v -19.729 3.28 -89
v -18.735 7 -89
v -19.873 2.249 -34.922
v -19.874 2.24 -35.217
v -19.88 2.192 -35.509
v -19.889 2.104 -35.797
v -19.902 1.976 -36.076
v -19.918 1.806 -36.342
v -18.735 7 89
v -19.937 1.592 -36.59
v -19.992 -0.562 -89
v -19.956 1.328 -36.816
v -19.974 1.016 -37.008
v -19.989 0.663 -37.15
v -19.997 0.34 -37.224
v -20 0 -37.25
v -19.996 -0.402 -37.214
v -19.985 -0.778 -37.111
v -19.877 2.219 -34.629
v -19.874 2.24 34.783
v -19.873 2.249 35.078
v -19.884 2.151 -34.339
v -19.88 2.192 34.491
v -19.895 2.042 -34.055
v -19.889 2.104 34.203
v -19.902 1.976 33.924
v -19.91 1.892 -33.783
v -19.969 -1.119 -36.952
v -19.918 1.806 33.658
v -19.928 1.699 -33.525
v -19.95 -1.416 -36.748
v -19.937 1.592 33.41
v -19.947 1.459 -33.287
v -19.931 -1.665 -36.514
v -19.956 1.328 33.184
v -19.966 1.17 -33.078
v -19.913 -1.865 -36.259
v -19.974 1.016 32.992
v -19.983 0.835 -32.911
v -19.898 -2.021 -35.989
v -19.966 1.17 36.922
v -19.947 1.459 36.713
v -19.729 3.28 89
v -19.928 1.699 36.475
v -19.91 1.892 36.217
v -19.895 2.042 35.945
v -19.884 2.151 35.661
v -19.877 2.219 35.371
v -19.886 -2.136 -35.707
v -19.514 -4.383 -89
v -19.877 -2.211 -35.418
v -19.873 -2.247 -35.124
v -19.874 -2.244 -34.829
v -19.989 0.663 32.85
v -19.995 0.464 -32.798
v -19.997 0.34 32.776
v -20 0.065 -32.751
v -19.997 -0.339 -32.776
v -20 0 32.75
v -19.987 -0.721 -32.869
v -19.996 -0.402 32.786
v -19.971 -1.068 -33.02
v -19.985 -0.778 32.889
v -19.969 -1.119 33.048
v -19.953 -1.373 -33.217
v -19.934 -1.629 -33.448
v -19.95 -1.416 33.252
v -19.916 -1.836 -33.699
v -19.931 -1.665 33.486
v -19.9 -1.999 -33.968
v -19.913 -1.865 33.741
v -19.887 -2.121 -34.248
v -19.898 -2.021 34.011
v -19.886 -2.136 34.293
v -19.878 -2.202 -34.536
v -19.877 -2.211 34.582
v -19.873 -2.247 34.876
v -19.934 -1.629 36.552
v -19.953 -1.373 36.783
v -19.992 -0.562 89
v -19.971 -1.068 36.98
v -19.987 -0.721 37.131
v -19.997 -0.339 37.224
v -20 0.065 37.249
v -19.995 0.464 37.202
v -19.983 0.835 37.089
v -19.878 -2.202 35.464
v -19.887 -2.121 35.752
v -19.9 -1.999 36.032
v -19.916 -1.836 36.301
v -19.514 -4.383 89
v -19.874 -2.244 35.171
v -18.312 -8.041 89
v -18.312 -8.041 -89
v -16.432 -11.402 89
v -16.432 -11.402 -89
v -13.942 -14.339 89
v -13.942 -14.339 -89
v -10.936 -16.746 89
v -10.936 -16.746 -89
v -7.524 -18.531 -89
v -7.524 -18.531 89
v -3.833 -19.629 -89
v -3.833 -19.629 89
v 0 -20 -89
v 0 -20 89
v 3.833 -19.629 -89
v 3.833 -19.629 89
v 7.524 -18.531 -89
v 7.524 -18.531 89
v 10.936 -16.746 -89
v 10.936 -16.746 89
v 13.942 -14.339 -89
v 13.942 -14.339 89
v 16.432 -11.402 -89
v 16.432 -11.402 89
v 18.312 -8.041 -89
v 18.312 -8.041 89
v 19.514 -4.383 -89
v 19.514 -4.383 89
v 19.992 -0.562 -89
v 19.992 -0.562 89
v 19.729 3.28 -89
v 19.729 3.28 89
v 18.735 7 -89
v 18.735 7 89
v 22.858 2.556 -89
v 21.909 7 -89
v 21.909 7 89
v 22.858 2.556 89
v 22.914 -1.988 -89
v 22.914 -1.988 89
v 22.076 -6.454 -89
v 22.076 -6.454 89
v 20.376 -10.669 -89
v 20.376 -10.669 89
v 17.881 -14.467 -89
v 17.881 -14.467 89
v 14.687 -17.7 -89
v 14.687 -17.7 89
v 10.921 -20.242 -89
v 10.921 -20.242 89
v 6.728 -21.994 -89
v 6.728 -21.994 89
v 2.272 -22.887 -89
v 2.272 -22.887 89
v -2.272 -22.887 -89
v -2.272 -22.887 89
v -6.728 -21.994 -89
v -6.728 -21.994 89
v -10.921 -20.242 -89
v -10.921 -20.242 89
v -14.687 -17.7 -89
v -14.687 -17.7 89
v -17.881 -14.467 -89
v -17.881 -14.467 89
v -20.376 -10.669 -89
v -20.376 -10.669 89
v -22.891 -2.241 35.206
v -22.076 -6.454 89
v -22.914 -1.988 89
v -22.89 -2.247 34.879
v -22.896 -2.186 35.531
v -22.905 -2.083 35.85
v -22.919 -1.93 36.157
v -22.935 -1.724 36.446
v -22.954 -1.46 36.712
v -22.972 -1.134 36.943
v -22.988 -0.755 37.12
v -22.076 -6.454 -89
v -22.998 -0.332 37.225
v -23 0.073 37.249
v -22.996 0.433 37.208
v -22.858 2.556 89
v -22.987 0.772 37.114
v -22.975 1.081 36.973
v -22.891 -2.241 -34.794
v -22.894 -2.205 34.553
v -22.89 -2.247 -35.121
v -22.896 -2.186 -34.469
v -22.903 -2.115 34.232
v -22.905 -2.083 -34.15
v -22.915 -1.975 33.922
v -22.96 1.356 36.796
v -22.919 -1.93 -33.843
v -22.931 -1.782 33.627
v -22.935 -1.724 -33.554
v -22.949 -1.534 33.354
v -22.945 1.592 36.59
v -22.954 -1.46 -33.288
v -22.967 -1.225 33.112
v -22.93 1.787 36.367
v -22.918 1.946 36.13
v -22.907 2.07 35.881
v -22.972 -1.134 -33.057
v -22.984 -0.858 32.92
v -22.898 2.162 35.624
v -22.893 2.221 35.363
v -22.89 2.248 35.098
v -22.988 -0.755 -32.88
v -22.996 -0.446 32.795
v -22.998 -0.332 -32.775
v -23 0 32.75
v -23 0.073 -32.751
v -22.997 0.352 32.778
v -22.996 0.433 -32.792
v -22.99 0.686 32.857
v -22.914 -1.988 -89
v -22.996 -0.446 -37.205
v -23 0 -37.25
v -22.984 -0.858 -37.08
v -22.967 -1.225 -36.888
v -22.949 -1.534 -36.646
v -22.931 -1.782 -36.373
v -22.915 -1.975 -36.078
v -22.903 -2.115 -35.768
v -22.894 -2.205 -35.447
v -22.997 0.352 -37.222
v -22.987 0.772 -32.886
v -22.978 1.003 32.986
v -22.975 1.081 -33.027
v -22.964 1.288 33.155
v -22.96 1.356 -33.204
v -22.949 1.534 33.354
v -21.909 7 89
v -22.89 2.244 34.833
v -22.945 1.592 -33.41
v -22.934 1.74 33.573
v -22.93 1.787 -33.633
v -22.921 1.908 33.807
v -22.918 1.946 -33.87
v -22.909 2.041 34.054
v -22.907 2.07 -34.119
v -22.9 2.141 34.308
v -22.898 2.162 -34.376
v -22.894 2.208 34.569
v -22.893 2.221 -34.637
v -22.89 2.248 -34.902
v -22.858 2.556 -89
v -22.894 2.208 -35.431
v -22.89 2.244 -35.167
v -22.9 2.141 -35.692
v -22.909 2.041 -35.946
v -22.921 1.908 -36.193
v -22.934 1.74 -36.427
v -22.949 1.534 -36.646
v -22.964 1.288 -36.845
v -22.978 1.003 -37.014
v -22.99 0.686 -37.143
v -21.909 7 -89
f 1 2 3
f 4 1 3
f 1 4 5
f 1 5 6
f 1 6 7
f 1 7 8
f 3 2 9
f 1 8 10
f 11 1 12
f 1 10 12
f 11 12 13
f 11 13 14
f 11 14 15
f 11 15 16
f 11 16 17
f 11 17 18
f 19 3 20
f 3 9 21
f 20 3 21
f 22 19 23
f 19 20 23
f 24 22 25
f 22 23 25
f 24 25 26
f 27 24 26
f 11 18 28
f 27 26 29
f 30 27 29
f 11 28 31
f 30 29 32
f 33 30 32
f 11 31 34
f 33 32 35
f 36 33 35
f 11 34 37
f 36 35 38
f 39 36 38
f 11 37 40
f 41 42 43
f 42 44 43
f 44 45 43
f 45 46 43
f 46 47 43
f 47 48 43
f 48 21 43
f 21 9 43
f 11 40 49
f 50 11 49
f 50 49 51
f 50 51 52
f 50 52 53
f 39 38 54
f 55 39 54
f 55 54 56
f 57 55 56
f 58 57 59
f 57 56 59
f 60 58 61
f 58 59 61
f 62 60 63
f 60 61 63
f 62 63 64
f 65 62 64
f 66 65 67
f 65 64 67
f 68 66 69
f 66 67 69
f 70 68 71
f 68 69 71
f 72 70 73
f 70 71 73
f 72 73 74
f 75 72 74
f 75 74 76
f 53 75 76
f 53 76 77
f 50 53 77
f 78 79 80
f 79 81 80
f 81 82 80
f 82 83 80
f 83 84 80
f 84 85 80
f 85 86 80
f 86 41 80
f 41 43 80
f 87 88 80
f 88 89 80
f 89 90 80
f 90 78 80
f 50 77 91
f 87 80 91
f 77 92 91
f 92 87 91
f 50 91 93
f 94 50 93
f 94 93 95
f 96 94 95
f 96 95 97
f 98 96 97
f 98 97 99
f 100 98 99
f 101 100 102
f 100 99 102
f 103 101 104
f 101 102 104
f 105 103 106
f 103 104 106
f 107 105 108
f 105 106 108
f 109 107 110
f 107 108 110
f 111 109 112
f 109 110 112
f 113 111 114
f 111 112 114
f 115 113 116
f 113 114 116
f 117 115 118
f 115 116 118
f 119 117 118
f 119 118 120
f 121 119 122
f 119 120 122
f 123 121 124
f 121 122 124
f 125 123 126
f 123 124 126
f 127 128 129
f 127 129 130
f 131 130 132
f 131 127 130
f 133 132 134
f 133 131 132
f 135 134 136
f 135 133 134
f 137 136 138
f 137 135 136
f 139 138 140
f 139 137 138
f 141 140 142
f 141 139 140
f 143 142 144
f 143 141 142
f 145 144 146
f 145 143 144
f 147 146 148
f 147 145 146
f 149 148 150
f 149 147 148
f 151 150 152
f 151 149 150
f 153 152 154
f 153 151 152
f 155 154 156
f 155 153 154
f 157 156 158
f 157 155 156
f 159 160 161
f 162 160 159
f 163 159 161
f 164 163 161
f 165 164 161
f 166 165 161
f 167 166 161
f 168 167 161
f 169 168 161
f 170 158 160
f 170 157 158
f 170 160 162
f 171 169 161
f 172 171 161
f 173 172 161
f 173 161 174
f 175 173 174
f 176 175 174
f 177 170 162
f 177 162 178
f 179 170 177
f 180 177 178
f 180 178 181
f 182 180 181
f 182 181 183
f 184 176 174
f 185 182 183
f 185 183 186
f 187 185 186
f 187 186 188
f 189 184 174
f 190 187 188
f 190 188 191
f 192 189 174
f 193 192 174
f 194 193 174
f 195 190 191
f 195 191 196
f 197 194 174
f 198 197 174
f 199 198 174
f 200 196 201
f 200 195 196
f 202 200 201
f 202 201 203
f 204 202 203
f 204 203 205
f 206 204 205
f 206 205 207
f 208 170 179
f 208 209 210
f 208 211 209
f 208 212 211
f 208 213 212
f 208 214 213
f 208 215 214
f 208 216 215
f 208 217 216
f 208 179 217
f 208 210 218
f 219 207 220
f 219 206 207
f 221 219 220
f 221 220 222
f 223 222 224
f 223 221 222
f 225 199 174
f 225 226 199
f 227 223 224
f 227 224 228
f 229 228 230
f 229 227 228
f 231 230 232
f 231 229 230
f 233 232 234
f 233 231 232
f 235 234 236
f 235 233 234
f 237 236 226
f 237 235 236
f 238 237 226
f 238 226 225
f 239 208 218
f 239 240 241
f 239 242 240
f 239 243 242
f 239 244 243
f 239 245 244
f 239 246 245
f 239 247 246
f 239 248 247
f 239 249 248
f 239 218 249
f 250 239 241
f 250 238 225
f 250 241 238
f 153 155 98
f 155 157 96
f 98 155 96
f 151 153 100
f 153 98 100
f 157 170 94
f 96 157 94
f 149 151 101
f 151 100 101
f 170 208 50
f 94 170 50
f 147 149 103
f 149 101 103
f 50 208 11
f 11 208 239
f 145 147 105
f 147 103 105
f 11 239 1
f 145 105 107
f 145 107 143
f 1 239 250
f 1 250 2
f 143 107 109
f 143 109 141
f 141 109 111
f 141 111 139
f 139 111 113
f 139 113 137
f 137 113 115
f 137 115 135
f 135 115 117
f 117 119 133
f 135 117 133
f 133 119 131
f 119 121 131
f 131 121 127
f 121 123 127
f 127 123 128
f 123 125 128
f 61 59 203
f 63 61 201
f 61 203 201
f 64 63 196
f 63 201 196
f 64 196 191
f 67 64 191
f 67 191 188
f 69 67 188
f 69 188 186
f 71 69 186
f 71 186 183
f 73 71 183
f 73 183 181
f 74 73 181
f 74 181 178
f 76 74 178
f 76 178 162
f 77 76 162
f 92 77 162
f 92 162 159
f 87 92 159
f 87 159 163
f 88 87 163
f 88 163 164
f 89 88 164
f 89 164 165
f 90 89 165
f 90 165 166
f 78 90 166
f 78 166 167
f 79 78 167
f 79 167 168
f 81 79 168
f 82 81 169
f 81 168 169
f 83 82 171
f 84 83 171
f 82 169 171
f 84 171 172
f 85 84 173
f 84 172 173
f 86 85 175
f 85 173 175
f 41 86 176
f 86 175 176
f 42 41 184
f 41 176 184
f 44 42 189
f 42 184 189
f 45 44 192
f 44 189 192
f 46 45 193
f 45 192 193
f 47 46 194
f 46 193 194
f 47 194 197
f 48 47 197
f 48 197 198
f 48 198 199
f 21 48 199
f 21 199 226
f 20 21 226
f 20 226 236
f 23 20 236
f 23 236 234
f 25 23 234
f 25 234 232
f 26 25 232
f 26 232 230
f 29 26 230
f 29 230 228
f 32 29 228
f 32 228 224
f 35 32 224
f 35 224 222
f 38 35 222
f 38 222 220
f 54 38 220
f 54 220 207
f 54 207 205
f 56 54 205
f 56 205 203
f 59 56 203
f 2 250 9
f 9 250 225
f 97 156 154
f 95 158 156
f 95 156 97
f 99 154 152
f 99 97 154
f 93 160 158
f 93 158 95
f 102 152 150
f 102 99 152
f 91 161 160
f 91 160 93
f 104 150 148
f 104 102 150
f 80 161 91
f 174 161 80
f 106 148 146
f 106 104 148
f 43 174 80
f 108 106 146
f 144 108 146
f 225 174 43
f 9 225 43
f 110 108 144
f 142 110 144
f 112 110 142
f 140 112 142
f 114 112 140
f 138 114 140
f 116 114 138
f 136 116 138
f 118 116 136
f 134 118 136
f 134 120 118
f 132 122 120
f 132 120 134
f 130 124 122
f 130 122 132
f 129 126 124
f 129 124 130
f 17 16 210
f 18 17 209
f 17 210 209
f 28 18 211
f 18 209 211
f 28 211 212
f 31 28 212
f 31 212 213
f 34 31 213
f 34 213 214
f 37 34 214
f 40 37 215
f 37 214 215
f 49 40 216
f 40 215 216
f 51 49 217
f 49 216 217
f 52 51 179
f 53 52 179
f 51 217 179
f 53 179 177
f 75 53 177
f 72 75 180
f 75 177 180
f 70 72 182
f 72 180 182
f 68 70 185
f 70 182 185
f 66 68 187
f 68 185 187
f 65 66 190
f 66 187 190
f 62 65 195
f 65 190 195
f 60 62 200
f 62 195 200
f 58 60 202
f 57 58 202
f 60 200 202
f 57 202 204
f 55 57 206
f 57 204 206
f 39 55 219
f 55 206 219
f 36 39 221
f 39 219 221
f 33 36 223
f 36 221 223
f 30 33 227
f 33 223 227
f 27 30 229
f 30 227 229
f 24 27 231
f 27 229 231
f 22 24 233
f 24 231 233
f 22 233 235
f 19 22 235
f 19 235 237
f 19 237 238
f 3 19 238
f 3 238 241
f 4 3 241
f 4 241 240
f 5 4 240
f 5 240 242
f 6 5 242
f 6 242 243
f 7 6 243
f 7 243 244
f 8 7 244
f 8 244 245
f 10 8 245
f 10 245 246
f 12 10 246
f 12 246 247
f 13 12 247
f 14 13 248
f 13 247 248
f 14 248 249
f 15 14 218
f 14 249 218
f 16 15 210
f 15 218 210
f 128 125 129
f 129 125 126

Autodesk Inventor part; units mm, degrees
ref_plane "YZ Plane" through (0, 0, 0) normal (1, 0, 0) x (0, 1, 0)
ref_plane "XZ Plane" through (0, 0, 0) normal (0, 1, 0) x (-1, 0, 0)
ref_plane "XY Plane" through (0, 0, 0) normal (0, 0, 1) x (1, 0, 0)
sketch "Sketch1" plane through (0, 0, 0) normal (0, 0, 1) x (1, 0, 0)
  circle A0 centre (0, 0) radius 20
  circle A1 centre (0, 0) radius 23
  dimension "d0" = 40
  dimension "d1" = 46
extrude "Extrusion1" add sketch "Sketch1" along normal mid plane 178
sketch "Sketch2" plane through (0, 0, 0) normal (1, 0, 0) x (0, 1, 0)
  line L0 (0, 70) -> (0, -70) projected
  line L1 (-70, 0) -> (70, 0) projected
  point P0 (0, 0)
  point P1 (0, 35)
  point P2 (0, -35)
  dimension "d19" = 35
  dimension "d20" = 70
hole "Hole1" at (0, 0, 35) at (0, 0, -35) direction (-1, 0, 0) diameter 4.5 end through all clearance for "Flat Head Machine Screw" size "M4" standard "Ansi Metric M Profile"
sketch "Sketch3" plane through (0, 0, 0) normal (1, 0, 0) x (0, 1, 0)
  line L0 (23, -89) -> (7, -89)
  line L1 (7, -89) -> (7, 89)
  line L2 (7, 89) -> (23, 89)
  line L3 (23, 89) -> (23, -89)
  line L4 (23, 89) -> (-23, 89) projected
  line L5 (-23, -89) -> (23, -89) projected
  line L6 (0, 159.6) -> (0, -159.6) projected
  point P0 (0, 0)
  dimension "d13" = 0
  dimension "d14" = 0
  dimension "d15" = 7
extrude "Extrusion2" cut sketch "Sketch3" along normal through all both and the other way through all contours L0 L1 L2 L3
equation "\"d19\" = 0.5 * d20"
properties part number "Top_Tilt Pipe_3 Lanes" material "PVC-Piping"
